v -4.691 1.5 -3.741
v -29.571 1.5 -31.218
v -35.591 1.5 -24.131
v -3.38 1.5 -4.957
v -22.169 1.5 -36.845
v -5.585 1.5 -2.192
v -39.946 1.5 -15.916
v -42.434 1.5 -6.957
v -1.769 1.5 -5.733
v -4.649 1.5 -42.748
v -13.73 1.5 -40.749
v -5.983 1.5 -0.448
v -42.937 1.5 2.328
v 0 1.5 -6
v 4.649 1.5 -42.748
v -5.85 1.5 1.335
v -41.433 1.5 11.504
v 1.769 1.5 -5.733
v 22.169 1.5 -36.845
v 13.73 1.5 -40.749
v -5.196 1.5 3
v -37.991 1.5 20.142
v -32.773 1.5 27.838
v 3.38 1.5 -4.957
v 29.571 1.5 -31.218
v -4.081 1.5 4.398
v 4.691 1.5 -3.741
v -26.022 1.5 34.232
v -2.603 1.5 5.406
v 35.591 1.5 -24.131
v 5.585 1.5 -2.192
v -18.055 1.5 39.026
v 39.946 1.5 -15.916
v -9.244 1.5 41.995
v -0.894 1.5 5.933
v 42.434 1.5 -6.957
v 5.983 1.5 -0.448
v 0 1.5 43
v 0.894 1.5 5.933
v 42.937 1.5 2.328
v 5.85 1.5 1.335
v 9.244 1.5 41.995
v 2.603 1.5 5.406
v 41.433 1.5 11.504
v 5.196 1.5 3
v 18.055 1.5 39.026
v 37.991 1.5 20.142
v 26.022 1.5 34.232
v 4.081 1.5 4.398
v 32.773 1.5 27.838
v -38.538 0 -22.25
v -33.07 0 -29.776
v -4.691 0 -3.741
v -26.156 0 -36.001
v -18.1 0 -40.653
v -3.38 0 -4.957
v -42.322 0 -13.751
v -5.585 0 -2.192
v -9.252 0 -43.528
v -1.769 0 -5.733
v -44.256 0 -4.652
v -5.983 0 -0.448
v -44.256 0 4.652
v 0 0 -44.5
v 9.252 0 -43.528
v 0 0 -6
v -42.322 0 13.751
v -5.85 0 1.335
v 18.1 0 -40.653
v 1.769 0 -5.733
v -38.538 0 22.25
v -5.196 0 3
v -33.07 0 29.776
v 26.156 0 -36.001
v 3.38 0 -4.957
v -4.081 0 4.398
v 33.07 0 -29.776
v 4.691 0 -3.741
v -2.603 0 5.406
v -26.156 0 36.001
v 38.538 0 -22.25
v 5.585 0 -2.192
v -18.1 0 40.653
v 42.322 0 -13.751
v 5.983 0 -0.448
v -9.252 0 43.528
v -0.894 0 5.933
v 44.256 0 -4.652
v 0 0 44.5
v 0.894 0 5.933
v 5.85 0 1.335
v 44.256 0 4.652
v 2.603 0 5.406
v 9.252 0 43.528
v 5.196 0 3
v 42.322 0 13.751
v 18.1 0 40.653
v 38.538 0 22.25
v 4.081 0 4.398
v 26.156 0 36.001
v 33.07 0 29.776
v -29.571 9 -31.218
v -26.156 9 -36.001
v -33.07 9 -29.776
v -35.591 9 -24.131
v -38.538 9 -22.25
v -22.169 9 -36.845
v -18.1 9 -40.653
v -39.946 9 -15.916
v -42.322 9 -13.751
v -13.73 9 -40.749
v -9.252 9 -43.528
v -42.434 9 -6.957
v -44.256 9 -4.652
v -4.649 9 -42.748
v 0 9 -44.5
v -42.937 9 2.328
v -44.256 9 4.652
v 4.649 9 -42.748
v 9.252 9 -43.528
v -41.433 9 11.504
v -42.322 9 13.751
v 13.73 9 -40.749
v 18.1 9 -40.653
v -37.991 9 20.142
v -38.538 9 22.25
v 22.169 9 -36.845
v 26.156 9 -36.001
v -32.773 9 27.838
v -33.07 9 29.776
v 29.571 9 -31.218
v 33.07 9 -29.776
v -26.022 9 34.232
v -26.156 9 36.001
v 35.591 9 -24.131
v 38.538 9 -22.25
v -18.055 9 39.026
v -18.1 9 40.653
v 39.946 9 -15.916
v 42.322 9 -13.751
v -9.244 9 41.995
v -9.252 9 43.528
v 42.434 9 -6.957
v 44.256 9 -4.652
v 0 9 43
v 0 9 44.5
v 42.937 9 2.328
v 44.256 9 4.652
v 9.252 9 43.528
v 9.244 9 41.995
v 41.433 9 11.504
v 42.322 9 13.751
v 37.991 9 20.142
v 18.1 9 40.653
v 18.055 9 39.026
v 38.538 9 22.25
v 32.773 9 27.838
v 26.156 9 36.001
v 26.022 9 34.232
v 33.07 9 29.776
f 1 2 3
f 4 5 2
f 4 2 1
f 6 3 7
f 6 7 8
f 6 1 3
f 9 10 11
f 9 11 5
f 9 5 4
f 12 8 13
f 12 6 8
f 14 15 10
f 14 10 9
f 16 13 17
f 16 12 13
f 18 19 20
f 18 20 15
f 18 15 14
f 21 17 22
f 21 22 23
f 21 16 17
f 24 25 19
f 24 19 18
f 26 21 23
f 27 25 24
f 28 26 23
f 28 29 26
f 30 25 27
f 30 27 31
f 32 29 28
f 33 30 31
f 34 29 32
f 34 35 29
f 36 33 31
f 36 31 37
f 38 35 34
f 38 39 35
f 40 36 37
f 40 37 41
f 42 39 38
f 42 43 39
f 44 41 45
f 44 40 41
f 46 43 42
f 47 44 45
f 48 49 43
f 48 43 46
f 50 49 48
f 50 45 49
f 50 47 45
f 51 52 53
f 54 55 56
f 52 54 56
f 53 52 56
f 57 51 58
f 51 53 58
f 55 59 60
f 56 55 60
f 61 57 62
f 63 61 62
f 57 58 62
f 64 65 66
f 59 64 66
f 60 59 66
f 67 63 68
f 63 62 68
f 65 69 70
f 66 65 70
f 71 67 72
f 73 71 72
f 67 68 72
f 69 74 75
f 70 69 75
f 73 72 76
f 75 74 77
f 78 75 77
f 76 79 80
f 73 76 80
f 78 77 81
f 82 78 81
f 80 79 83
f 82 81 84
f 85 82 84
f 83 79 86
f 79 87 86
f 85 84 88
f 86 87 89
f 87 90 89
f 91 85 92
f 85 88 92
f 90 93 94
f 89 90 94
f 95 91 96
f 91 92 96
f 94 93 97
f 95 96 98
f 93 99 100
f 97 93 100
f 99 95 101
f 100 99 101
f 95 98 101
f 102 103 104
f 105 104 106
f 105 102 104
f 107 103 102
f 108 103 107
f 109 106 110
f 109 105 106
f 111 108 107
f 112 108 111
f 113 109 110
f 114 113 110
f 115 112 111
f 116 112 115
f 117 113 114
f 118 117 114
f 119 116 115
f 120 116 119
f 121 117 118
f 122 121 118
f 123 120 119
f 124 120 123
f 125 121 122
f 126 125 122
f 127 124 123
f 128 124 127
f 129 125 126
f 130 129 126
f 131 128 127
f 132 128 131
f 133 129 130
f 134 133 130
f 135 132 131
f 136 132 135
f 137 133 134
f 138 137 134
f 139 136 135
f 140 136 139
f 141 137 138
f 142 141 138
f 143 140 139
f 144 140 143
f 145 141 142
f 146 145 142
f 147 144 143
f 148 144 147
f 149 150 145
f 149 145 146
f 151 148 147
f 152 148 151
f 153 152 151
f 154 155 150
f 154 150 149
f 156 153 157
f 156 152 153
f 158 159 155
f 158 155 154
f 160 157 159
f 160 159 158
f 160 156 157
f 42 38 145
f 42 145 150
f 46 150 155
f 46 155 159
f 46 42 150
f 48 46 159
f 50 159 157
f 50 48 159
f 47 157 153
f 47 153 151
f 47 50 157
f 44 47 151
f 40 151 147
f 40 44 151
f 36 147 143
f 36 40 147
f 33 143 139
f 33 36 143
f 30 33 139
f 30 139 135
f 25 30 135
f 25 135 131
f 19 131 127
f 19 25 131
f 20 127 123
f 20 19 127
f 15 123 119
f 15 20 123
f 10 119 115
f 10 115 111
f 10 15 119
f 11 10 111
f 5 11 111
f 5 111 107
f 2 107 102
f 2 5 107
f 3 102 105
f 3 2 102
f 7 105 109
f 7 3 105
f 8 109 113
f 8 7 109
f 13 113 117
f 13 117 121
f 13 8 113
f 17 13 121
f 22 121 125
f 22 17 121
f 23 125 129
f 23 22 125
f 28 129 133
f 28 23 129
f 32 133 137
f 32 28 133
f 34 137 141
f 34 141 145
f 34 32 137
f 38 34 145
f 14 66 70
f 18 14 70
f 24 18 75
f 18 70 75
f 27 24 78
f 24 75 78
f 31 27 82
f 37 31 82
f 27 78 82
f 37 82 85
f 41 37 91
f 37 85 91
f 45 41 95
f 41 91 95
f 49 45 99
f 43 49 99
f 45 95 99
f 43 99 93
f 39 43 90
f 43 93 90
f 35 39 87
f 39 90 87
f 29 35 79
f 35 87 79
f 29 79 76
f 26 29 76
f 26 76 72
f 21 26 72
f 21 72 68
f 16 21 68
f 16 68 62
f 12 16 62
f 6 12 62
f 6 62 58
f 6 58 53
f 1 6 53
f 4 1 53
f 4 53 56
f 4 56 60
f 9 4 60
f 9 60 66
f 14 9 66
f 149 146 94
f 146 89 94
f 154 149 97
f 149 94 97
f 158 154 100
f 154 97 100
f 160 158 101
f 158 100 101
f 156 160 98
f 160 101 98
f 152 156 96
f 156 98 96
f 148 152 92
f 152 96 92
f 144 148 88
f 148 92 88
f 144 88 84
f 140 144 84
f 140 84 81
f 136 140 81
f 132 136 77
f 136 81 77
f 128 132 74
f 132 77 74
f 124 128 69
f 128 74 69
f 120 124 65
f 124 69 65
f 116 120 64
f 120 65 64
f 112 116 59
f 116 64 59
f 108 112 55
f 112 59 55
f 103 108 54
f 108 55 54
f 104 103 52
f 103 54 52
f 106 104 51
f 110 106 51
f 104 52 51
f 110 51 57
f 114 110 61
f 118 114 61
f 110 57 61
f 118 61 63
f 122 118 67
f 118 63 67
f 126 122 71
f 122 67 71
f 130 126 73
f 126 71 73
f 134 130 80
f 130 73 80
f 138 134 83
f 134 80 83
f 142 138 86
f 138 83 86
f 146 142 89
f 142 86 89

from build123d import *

# Parameters (mm, degrees)
SKETCH_1_R          = 44.5
EXTRUDE_1_DEPTH     = 1.5
SKETCH_2_R          = 44.5
SKETCH_2_R_2        = 43
EXTRUDE_2_DEPTH     = 7.5
SKETCH_3_R          = 6
CUT_EXTRUDE_1_DEPTH = 64.572792923


with BuildPart() as part:
    # Эскиз1 → Бобышка-Вытянуть1 (new body)
    with BuildSketch(Plane(origin=(0, 0, 0), x_dir=(1, 0, 0), z_dir=(0, 1, 0))):
        with Locations(Location((0, 0, 0), (0, 0, 270))):
            Circle(SKETCH_1_R)
    extrude(amount=EXTRUDE_1_DEPTH)

    # Эскиз2 → Бобышка-Вытянуть2 (add)
    with BuildSketch(Plane(origin=(0, 1.5, 0), x_dir=(1, 0, 0), z_dir=(0, 1, 0))):
        with Locations(Location((0, 0, 0), (0, 0, 270))):
            Circle(SKETCH_2_R)
        with Locations(Location((0, 0, 0), (0, 0, 270))):
            Circle(SKETCH_2_R_2, mode=Mode.SUBTRACT)
    extrude(amount=EXTRUDE_2_DEPTH)

    # Эскиз3 → Вырез-Вытянуть1 (cut, through all)
    with BuildSketch(Plane.XZ):
        with Locations(Location((0, 0, 0), (0, 0, 270))):
            Circle(SKETCH_3_R)
    extrude(amount=-CUT_EXTRUDE_1_DEPTH, mode=Mode.SUBTRACT)


solid = part.part
